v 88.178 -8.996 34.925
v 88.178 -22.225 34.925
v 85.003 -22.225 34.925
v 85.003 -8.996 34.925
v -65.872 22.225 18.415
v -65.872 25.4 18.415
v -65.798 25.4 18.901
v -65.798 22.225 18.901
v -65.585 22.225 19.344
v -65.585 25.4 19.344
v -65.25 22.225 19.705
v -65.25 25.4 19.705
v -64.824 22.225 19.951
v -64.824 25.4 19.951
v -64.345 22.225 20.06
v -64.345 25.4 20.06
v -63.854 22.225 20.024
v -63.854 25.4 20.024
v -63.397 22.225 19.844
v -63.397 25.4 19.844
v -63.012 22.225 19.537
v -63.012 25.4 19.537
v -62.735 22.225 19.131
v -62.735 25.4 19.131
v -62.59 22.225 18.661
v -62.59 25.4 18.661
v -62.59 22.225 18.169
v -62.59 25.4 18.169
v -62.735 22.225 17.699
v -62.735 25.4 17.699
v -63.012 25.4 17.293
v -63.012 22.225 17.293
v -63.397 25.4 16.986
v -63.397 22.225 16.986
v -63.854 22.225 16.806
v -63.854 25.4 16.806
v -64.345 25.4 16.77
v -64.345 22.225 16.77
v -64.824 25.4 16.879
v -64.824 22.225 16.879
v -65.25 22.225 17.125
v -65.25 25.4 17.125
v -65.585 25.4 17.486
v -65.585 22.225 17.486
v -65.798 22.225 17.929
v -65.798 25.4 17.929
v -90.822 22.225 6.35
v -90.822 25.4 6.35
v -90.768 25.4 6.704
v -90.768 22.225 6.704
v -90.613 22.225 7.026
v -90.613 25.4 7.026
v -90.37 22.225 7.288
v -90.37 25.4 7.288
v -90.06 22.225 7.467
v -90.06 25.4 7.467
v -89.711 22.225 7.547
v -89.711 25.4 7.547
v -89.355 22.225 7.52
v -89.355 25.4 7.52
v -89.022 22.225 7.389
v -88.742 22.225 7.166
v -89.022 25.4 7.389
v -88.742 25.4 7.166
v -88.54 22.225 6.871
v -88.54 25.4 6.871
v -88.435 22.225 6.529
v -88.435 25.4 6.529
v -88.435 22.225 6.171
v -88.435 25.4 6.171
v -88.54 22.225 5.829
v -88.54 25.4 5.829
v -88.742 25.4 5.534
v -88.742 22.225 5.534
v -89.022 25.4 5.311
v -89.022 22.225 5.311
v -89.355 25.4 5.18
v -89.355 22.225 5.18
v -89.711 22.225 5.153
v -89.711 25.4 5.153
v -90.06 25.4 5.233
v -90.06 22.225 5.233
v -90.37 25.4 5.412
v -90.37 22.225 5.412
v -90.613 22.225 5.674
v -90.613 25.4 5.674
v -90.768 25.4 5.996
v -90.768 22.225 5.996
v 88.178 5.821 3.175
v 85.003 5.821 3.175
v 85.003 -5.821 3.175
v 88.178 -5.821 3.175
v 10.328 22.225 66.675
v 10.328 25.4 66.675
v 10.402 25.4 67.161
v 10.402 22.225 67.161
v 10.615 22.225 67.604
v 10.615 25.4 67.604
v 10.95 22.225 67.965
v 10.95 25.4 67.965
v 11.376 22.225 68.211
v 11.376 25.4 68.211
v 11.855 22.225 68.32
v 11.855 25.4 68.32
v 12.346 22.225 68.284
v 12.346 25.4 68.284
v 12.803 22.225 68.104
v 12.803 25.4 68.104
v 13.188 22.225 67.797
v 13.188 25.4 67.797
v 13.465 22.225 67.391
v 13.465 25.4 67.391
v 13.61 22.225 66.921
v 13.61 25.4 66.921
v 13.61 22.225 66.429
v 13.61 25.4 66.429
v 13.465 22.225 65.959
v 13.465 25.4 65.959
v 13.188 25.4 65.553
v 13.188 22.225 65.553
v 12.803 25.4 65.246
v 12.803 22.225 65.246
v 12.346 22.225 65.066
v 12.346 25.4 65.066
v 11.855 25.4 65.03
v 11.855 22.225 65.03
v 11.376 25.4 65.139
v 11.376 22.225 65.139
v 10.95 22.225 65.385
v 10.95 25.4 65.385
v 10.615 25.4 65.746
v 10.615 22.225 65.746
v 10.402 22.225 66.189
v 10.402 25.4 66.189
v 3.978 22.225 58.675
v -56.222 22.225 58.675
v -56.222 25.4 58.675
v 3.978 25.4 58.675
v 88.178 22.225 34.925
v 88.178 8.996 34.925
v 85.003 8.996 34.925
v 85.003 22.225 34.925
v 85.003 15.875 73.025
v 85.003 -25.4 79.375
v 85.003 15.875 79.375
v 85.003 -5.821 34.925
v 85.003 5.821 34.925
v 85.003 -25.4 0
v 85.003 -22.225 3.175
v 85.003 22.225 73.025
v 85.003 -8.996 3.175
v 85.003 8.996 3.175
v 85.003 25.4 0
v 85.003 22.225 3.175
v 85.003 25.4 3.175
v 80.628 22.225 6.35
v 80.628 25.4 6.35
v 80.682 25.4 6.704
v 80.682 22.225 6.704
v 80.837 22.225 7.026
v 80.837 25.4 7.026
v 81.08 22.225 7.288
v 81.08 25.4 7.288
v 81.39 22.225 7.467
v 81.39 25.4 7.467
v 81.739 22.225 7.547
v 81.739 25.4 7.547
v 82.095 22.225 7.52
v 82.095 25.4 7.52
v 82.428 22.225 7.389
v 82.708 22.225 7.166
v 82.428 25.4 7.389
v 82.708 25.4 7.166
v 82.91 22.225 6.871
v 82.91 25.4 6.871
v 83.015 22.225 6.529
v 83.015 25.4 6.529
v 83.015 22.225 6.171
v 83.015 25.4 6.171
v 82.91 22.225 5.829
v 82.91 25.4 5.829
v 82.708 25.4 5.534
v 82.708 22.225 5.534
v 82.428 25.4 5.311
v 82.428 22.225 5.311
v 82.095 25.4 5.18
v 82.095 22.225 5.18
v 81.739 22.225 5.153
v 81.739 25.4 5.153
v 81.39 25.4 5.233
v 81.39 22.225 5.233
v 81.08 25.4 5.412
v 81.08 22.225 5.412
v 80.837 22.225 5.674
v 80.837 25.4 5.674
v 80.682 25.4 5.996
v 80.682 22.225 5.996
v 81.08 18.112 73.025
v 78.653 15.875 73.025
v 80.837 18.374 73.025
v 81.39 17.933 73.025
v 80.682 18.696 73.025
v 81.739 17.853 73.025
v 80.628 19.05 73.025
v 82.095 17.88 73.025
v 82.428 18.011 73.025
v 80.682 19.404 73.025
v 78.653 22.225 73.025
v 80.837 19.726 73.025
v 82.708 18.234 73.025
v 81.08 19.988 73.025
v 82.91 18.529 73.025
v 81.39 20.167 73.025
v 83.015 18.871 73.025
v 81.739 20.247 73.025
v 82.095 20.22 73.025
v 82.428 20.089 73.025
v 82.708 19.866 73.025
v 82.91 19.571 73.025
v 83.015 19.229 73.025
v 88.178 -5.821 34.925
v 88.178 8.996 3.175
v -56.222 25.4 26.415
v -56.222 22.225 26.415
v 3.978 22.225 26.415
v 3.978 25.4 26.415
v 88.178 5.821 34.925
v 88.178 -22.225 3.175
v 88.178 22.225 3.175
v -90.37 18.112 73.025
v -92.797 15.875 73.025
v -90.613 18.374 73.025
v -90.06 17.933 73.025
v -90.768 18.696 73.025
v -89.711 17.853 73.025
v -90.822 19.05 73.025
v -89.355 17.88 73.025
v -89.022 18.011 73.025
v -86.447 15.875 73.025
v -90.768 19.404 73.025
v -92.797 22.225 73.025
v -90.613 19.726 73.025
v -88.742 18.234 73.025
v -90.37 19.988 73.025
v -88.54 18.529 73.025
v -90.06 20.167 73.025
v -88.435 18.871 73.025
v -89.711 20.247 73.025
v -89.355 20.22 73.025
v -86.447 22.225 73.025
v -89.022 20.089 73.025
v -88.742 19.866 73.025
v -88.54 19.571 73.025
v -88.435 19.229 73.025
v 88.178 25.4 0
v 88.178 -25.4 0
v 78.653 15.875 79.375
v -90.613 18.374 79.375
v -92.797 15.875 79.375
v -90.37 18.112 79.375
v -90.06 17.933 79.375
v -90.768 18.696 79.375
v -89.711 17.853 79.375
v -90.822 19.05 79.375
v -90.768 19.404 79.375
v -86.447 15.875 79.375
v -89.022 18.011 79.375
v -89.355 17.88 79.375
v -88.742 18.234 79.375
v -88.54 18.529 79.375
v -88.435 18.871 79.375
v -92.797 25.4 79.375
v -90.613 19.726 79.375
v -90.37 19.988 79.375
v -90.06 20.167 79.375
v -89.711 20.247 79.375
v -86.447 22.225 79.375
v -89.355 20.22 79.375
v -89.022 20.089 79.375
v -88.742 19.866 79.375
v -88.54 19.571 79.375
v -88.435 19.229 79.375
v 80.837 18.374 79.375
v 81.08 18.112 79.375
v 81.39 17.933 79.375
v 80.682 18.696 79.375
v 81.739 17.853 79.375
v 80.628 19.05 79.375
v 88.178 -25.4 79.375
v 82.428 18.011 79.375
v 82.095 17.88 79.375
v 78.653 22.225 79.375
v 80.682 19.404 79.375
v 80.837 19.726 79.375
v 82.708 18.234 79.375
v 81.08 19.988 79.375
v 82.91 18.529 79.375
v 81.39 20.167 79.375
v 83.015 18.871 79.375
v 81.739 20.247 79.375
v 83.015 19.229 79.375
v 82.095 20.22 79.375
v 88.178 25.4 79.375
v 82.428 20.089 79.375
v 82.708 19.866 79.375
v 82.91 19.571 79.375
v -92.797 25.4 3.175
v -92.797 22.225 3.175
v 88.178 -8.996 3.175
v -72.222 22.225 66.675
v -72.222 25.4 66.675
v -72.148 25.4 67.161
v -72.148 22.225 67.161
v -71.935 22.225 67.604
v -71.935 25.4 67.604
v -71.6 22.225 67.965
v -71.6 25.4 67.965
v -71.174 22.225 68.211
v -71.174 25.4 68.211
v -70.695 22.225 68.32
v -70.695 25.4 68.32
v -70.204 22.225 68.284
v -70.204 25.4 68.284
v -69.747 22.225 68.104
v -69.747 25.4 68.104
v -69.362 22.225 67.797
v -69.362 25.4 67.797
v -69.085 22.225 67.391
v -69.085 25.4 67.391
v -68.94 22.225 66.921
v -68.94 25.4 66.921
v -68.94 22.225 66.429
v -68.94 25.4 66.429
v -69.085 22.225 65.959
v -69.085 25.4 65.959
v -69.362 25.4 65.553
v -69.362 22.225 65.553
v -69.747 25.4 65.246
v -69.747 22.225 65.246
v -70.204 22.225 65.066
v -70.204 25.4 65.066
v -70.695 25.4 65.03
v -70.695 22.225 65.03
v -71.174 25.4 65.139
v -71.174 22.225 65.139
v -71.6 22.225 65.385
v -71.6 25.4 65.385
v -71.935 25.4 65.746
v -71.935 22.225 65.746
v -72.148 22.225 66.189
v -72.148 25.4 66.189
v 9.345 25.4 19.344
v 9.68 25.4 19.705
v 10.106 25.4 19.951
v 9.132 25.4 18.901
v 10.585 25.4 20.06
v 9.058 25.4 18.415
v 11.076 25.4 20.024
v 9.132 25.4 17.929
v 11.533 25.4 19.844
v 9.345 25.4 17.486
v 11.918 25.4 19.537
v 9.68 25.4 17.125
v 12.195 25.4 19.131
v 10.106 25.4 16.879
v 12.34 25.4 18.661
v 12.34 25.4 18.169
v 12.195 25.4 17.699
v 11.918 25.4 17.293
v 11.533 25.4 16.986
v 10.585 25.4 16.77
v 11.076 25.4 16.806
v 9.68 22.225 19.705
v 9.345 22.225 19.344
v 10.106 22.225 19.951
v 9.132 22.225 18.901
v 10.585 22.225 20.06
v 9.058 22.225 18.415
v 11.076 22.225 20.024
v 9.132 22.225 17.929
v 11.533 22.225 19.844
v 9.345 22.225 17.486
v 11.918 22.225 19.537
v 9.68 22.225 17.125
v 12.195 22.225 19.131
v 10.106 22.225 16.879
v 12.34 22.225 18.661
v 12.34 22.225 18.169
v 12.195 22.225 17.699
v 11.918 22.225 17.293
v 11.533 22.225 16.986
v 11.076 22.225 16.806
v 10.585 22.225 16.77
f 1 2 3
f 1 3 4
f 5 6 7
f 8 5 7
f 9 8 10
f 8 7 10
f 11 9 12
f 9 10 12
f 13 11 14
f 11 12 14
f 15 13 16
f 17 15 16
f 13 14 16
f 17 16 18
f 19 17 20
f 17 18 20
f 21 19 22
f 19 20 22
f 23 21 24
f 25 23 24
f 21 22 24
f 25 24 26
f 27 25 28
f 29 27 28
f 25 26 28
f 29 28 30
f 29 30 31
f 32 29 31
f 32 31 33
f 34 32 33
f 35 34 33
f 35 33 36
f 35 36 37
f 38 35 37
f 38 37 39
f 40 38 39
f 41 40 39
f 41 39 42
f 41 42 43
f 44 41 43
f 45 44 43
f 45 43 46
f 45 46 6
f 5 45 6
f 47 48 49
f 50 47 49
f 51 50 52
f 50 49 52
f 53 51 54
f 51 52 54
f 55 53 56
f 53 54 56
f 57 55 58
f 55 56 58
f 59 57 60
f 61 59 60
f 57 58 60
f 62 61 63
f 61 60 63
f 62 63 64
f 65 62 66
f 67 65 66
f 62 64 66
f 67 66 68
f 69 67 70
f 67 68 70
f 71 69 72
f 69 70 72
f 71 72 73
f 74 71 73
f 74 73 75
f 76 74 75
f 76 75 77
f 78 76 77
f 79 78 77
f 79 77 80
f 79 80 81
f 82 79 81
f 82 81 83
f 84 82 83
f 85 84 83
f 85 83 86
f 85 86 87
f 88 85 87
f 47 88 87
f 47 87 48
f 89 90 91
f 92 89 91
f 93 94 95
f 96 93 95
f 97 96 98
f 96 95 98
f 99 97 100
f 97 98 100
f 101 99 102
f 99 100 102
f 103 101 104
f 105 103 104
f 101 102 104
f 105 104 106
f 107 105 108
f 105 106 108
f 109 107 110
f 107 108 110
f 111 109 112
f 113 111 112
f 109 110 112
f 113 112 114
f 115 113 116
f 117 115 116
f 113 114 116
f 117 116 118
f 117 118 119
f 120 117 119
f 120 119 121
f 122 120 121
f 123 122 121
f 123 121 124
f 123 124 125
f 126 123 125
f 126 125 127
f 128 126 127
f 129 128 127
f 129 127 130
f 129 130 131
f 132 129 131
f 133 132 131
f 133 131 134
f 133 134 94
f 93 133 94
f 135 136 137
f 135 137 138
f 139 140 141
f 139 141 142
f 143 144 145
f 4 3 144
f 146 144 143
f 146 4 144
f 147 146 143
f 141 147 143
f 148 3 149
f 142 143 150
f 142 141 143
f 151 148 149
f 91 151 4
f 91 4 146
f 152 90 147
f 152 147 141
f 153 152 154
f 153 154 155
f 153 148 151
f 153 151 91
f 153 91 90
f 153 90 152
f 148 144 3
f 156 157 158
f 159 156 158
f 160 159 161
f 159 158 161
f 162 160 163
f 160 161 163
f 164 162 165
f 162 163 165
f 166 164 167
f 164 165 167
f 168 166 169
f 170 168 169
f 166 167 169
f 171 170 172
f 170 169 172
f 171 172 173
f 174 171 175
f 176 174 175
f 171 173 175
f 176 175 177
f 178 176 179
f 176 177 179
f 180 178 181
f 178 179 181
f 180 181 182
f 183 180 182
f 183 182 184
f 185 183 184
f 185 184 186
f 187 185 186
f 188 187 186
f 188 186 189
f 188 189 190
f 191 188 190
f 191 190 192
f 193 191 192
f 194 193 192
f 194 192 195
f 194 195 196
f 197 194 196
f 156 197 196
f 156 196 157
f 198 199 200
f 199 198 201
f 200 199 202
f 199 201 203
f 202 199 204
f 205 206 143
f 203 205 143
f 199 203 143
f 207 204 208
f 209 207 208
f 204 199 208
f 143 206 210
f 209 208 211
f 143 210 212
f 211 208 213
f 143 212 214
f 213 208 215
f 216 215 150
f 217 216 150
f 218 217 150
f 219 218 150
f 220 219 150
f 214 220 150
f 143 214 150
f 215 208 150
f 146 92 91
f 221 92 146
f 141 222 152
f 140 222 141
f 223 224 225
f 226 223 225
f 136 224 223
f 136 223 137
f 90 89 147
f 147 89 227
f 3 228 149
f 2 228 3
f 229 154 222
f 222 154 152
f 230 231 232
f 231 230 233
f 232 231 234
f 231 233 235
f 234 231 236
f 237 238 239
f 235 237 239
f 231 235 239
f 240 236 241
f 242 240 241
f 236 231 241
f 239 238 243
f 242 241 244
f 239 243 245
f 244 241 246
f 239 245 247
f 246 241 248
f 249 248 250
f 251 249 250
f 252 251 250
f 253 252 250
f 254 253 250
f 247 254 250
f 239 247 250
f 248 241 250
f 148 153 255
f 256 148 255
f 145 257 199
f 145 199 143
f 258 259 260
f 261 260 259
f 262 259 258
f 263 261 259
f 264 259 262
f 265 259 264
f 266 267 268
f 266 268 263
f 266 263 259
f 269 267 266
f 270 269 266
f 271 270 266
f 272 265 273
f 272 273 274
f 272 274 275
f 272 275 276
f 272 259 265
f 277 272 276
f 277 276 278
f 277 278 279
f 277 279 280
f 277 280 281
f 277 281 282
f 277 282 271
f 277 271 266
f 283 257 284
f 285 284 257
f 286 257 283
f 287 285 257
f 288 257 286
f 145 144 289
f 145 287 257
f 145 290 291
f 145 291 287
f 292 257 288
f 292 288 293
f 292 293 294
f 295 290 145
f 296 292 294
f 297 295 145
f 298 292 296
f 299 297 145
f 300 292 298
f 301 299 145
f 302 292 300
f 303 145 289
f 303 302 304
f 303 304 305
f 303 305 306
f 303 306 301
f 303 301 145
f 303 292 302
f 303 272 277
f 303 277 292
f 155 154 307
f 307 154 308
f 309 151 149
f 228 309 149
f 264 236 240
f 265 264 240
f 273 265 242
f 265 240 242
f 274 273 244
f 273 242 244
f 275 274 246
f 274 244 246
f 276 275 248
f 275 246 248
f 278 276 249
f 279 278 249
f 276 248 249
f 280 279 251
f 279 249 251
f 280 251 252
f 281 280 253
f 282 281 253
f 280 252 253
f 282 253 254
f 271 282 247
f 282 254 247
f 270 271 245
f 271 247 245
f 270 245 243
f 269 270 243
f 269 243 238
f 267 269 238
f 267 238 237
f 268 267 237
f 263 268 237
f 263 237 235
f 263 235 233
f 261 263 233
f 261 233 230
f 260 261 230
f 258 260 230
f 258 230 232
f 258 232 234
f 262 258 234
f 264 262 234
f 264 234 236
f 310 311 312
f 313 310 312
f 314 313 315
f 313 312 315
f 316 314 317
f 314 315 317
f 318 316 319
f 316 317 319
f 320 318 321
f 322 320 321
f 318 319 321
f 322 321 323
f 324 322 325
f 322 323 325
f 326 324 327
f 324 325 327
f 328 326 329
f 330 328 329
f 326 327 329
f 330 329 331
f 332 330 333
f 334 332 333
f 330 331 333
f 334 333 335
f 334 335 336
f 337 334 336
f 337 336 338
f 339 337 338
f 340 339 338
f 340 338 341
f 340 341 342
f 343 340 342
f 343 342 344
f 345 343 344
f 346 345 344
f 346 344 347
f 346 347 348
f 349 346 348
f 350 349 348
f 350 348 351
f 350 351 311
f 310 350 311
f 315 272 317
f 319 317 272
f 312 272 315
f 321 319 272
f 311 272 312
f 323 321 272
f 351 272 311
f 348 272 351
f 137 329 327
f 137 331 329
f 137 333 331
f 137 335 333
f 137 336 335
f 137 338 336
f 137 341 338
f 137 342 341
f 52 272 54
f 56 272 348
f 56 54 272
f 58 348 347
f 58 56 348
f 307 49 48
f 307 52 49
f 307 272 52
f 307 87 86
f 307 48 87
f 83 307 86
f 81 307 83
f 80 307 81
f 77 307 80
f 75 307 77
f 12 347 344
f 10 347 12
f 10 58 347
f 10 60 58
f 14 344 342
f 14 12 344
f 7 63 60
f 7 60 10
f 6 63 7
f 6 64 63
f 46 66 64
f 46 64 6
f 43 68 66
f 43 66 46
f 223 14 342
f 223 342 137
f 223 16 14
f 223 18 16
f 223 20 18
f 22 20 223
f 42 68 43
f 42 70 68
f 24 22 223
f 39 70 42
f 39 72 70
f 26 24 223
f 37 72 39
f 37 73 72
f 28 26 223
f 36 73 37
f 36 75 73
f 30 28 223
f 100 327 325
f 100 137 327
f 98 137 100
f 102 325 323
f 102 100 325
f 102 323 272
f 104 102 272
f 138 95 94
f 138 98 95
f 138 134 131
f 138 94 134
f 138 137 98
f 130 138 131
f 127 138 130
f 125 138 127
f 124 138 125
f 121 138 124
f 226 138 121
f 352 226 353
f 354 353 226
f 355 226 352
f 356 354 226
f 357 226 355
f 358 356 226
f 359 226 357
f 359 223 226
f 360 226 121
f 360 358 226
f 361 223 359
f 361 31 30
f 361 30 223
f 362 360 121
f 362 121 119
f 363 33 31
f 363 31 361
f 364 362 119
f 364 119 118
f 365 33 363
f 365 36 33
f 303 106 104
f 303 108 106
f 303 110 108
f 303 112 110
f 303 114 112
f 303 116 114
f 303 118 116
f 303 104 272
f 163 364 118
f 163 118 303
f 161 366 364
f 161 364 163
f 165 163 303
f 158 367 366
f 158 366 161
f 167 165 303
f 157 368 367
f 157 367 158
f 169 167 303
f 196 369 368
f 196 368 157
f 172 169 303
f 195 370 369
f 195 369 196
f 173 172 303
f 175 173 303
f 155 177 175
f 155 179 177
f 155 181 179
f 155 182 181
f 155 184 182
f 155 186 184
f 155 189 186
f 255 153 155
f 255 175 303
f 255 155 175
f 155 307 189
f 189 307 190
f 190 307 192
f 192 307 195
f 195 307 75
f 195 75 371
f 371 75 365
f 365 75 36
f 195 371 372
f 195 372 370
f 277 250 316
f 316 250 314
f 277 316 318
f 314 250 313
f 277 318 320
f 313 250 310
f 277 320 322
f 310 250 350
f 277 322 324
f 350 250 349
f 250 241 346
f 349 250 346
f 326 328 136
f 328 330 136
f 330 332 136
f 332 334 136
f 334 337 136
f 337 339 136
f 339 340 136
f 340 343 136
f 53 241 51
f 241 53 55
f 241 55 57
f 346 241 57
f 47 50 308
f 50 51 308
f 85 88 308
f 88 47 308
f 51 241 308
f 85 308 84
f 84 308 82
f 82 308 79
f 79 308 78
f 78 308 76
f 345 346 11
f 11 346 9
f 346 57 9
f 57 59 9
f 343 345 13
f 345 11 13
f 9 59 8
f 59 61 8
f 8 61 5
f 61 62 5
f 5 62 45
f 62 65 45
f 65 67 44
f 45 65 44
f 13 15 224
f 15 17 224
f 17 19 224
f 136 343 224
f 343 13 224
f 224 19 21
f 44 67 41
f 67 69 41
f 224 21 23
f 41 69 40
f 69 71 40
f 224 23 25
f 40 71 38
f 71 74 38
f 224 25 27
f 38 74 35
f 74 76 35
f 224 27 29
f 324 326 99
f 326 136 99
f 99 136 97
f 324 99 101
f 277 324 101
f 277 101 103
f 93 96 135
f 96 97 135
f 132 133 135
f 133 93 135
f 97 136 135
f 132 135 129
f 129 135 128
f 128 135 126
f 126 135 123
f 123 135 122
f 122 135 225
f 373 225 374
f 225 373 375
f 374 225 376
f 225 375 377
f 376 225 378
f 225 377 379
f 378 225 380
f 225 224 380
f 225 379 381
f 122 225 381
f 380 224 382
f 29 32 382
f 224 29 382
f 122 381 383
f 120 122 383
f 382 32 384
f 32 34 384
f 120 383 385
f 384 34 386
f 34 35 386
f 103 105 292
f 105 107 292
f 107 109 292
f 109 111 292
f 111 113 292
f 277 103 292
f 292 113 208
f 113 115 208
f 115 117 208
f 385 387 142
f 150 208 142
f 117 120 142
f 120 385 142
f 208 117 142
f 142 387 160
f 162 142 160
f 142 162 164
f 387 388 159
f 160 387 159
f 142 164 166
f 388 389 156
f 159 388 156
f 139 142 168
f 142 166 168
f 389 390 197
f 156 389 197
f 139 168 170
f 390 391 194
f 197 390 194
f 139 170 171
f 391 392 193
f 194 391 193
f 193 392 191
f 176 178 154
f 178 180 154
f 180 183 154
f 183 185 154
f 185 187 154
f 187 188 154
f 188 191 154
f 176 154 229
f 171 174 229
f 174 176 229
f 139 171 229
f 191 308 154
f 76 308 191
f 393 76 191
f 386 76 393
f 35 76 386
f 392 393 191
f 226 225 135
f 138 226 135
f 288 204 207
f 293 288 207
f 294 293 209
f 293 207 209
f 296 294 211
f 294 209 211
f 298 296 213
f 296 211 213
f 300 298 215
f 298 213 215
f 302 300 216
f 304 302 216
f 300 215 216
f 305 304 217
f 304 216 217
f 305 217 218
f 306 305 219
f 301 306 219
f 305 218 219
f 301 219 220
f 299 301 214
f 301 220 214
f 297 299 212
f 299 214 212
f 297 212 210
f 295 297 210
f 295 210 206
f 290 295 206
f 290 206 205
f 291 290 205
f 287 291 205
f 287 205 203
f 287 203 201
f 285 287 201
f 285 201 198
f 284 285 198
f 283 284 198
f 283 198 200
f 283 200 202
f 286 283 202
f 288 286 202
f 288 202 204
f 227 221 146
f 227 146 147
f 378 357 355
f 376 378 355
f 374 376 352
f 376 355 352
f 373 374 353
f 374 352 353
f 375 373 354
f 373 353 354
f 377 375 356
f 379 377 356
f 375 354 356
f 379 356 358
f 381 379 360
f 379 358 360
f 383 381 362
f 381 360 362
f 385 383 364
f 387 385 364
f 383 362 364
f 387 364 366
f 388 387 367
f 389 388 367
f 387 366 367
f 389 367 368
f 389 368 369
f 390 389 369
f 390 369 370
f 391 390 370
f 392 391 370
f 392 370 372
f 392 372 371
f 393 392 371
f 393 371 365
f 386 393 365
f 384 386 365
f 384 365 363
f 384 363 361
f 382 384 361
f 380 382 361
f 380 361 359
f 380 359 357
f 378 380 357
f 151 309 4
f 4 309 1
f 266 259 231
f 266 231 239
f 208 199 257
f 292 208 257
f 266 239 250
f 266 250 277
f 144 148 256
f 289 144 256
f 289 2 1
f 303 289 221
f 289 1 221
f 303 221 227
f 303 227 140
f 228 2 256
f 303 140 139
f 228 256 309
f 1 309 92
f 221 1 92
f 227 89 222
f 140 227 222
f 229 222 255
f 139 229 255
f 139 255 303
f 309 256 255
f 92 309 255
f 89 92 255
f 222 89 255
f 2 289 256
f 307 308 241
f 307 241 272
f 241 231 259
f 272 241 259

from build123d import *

# Parameters (mm, degrees)
F0_W      = 184.15
F0_H      = 50.8
F1_DEPTH  = 3.175
F3_D      = 3.2
F4_W      = 184.15
F4_H      = 3.175
F5_DEPTH  = 76.2
F7_D      = 3.3
F8_W      = 3.175
F8_H      = 47.625
F9_DEPTH  = 76.2
F10_W     = 19.05
F10_H     = 34.925
F11_DEPTH = 3.175
F12_W     = 3.175
F12_H     = 47.625
F13_DEPTH = 76.2
F14_W     = 13.2291666667
F14_H     = 31.75
F14_W_2   = 11.6416666667
F15_DEPTH = 3.175
F16_W     = 6.35
F16_H     = 6.35
F17_DEPTH = 6.35
F19_D     = 2.4
F19_DEPTH = 12.7
F19_TIP   = 0.7210327428
F20_W     = 121.4
F20_H     = 34.925
F21_DEPTH = 25.4
F22_W     = 60.2
F22_H     = 32.26
F23_DEPTH = 25.4
F25_DEPTH = 50.801
F27_D     = 2.4
F27_DEPTH = 12.7
F27_TIP   = 0.7210327428


with BuildPart() as f1:
    # F0 (on Top) → F1 (new body)
    with BuildSketch(Plane.XY):
        with Locations((-3.8965528874, 0)):
            Rectangle(F0_W, F0_H)
    extrude(amount=F1_DEPTH)

    # F3 (through all)
    with Locations(Plane.XY.offset(3.175)):
        with Locations((-78.8965528874, 9.525), (-78.8965528874, -15.475), (71.1034471126, -15.475), (71.1034471126, 9.525)):
            Hole(F3_D / 2)

    # F4 (on face) → F5 (join)
    with BuildSketch(Plane.XY.offset(3.175)):
        with Locations((-3.8965528874, 23.8125)):
            Rectangle(F4_W, F4_H)
    extrude(amount=F5_DEPTH)

    # F7 (through all)
    with Locations(Plane.XZ.offset(-22.225)):
        with Locations((-70.5715528874, 66.675), (11.9784471126, 66.675), (10.7084471126, 18.415), (-64.2215528874, 18.415)):
            Hole(F7_D / 2)

    # F8 (on face) → F9 (join)
    with BuildSketch(Plane.XY.offset(3.175)):
        with Locations((-94.3840528874, -1.5875)):
            Rectangle(F8_W, F8_H)
    extrude(amount=F9_DEPTH)

    # F10 (on face) → F11 (cut, through all)
    with BuildSketch(Plane(origin=(-95.9715528874, 0, 0), x_dir=(0, -1, 0), z_dir=(-1, 0, 0))):
        with Locations((12.7, 58.7375)):
            Rectangle(F10_W, F10_H)
        with Locations((12.7, 20.6375)):
            Rectangle(F10_W, F10_H)
    extrude(amount=-F11_DEPTH, mode=Mode.SUBTRACT)

    # F12 (on face) → F13 (join)
    with BuildSketch(Plane.XY.offset(3.175)):
        with Locations((86.5909471126, -1.5875)):
            Rectangle(F12_W, F12_H)
    extrude(amount=F13_DEPTH)

    # F14 (on face) → F15 (cut, through all)
    with BuildSketch(Plane.YZ.offset(88.1784471126)):
        with Locations((-15.6104166667, 19.05)):
            Rectangle(F14_W, F14_H)
        with Locations((0, 19.05)):
            Rectangle(F14_W_2, F14_H)
        with Locations((15.6104166667, 19.05)):
            Rectangle(F14_W, F14_H)
    extrude(amount=-F15_DEPTH, mode=Mode.SUBTRACT)

    # F16 (on face) → F17 (join)
    with BuildSketch(Plane.XZ.offset(-22.225)):
        with Locations((-89.6215528874, 76.2)):
            Rectangle(F16_W, F16_H)
        with Locations((81.8284471126, 76.2)):
            Rectangle(F16_W, F16_H)
    extrude(amount=F17_DEPTH)

    # F19
    with Locations(Plane.XY.offset(79.375)):
        with Locations((-89.6215528874, 19.05), (81.8284471126, 19.05)):
            Hole(F19_D / 2, depth=F19_DEPTH)
            with Locations((0, 0, -(F19_DEPTH + F19_TIP / 2))):  # 118° drill point
                Cone(0, F19_D / 2, F19_TIP, mode=Mode.SUBTRACT)

    # F20 (on face) → F21 (cut)
    with BuildSketch(Plane.XY.offset(3.175)):
        with Locations((-3.8965528874, -1.5875)):
            Rectangle(F20_W, F20_H)
    extrude(amount=-F21_DEPTH, mode=Mode.SUBTRACT)

    # F22 (on face) → F23 (cut)
    with BuildSketch(Plane.XZ.offset(-22.225)):
        with Locations((-26.1215528874, 42.545)):
            Rectangle(F22_W, F22_H)
    extrude(amount=-F23_DEPTH, mode=Mode.SUBTRACT)

    # F24 (on face) → F25 (cut, through all)
    with BuildSketch(Plane.XZ.offset(25.4)):
        Polygon((-92.7965528874, 79.375), (-95.9715528874, 79.375), (-95.9715528874, 0), (85.0034471126, 0), (85.0034471126, 3.175), (-92.7965528874, 3.175), align=None)
    extrude(amount=-F25_DEPTH, mode=Mode.SUBTRACT)

    # F27
    with Locations(Plane.XZ.offset(-22.225)):
        with Locations((-89.6215528874, 6.35), (81.8284471126, 6.35)):
            Hole(F27_D / 2, depth=F27_DEPTH)
            with Locations((0, 0, -(F27_DEPTH + F27_TIP / 2))):  # 118° drill point
                Cone(0, F27_D / 2, F27_TIP, mode=Mode.SUBTRACT)


solid = f1.part
